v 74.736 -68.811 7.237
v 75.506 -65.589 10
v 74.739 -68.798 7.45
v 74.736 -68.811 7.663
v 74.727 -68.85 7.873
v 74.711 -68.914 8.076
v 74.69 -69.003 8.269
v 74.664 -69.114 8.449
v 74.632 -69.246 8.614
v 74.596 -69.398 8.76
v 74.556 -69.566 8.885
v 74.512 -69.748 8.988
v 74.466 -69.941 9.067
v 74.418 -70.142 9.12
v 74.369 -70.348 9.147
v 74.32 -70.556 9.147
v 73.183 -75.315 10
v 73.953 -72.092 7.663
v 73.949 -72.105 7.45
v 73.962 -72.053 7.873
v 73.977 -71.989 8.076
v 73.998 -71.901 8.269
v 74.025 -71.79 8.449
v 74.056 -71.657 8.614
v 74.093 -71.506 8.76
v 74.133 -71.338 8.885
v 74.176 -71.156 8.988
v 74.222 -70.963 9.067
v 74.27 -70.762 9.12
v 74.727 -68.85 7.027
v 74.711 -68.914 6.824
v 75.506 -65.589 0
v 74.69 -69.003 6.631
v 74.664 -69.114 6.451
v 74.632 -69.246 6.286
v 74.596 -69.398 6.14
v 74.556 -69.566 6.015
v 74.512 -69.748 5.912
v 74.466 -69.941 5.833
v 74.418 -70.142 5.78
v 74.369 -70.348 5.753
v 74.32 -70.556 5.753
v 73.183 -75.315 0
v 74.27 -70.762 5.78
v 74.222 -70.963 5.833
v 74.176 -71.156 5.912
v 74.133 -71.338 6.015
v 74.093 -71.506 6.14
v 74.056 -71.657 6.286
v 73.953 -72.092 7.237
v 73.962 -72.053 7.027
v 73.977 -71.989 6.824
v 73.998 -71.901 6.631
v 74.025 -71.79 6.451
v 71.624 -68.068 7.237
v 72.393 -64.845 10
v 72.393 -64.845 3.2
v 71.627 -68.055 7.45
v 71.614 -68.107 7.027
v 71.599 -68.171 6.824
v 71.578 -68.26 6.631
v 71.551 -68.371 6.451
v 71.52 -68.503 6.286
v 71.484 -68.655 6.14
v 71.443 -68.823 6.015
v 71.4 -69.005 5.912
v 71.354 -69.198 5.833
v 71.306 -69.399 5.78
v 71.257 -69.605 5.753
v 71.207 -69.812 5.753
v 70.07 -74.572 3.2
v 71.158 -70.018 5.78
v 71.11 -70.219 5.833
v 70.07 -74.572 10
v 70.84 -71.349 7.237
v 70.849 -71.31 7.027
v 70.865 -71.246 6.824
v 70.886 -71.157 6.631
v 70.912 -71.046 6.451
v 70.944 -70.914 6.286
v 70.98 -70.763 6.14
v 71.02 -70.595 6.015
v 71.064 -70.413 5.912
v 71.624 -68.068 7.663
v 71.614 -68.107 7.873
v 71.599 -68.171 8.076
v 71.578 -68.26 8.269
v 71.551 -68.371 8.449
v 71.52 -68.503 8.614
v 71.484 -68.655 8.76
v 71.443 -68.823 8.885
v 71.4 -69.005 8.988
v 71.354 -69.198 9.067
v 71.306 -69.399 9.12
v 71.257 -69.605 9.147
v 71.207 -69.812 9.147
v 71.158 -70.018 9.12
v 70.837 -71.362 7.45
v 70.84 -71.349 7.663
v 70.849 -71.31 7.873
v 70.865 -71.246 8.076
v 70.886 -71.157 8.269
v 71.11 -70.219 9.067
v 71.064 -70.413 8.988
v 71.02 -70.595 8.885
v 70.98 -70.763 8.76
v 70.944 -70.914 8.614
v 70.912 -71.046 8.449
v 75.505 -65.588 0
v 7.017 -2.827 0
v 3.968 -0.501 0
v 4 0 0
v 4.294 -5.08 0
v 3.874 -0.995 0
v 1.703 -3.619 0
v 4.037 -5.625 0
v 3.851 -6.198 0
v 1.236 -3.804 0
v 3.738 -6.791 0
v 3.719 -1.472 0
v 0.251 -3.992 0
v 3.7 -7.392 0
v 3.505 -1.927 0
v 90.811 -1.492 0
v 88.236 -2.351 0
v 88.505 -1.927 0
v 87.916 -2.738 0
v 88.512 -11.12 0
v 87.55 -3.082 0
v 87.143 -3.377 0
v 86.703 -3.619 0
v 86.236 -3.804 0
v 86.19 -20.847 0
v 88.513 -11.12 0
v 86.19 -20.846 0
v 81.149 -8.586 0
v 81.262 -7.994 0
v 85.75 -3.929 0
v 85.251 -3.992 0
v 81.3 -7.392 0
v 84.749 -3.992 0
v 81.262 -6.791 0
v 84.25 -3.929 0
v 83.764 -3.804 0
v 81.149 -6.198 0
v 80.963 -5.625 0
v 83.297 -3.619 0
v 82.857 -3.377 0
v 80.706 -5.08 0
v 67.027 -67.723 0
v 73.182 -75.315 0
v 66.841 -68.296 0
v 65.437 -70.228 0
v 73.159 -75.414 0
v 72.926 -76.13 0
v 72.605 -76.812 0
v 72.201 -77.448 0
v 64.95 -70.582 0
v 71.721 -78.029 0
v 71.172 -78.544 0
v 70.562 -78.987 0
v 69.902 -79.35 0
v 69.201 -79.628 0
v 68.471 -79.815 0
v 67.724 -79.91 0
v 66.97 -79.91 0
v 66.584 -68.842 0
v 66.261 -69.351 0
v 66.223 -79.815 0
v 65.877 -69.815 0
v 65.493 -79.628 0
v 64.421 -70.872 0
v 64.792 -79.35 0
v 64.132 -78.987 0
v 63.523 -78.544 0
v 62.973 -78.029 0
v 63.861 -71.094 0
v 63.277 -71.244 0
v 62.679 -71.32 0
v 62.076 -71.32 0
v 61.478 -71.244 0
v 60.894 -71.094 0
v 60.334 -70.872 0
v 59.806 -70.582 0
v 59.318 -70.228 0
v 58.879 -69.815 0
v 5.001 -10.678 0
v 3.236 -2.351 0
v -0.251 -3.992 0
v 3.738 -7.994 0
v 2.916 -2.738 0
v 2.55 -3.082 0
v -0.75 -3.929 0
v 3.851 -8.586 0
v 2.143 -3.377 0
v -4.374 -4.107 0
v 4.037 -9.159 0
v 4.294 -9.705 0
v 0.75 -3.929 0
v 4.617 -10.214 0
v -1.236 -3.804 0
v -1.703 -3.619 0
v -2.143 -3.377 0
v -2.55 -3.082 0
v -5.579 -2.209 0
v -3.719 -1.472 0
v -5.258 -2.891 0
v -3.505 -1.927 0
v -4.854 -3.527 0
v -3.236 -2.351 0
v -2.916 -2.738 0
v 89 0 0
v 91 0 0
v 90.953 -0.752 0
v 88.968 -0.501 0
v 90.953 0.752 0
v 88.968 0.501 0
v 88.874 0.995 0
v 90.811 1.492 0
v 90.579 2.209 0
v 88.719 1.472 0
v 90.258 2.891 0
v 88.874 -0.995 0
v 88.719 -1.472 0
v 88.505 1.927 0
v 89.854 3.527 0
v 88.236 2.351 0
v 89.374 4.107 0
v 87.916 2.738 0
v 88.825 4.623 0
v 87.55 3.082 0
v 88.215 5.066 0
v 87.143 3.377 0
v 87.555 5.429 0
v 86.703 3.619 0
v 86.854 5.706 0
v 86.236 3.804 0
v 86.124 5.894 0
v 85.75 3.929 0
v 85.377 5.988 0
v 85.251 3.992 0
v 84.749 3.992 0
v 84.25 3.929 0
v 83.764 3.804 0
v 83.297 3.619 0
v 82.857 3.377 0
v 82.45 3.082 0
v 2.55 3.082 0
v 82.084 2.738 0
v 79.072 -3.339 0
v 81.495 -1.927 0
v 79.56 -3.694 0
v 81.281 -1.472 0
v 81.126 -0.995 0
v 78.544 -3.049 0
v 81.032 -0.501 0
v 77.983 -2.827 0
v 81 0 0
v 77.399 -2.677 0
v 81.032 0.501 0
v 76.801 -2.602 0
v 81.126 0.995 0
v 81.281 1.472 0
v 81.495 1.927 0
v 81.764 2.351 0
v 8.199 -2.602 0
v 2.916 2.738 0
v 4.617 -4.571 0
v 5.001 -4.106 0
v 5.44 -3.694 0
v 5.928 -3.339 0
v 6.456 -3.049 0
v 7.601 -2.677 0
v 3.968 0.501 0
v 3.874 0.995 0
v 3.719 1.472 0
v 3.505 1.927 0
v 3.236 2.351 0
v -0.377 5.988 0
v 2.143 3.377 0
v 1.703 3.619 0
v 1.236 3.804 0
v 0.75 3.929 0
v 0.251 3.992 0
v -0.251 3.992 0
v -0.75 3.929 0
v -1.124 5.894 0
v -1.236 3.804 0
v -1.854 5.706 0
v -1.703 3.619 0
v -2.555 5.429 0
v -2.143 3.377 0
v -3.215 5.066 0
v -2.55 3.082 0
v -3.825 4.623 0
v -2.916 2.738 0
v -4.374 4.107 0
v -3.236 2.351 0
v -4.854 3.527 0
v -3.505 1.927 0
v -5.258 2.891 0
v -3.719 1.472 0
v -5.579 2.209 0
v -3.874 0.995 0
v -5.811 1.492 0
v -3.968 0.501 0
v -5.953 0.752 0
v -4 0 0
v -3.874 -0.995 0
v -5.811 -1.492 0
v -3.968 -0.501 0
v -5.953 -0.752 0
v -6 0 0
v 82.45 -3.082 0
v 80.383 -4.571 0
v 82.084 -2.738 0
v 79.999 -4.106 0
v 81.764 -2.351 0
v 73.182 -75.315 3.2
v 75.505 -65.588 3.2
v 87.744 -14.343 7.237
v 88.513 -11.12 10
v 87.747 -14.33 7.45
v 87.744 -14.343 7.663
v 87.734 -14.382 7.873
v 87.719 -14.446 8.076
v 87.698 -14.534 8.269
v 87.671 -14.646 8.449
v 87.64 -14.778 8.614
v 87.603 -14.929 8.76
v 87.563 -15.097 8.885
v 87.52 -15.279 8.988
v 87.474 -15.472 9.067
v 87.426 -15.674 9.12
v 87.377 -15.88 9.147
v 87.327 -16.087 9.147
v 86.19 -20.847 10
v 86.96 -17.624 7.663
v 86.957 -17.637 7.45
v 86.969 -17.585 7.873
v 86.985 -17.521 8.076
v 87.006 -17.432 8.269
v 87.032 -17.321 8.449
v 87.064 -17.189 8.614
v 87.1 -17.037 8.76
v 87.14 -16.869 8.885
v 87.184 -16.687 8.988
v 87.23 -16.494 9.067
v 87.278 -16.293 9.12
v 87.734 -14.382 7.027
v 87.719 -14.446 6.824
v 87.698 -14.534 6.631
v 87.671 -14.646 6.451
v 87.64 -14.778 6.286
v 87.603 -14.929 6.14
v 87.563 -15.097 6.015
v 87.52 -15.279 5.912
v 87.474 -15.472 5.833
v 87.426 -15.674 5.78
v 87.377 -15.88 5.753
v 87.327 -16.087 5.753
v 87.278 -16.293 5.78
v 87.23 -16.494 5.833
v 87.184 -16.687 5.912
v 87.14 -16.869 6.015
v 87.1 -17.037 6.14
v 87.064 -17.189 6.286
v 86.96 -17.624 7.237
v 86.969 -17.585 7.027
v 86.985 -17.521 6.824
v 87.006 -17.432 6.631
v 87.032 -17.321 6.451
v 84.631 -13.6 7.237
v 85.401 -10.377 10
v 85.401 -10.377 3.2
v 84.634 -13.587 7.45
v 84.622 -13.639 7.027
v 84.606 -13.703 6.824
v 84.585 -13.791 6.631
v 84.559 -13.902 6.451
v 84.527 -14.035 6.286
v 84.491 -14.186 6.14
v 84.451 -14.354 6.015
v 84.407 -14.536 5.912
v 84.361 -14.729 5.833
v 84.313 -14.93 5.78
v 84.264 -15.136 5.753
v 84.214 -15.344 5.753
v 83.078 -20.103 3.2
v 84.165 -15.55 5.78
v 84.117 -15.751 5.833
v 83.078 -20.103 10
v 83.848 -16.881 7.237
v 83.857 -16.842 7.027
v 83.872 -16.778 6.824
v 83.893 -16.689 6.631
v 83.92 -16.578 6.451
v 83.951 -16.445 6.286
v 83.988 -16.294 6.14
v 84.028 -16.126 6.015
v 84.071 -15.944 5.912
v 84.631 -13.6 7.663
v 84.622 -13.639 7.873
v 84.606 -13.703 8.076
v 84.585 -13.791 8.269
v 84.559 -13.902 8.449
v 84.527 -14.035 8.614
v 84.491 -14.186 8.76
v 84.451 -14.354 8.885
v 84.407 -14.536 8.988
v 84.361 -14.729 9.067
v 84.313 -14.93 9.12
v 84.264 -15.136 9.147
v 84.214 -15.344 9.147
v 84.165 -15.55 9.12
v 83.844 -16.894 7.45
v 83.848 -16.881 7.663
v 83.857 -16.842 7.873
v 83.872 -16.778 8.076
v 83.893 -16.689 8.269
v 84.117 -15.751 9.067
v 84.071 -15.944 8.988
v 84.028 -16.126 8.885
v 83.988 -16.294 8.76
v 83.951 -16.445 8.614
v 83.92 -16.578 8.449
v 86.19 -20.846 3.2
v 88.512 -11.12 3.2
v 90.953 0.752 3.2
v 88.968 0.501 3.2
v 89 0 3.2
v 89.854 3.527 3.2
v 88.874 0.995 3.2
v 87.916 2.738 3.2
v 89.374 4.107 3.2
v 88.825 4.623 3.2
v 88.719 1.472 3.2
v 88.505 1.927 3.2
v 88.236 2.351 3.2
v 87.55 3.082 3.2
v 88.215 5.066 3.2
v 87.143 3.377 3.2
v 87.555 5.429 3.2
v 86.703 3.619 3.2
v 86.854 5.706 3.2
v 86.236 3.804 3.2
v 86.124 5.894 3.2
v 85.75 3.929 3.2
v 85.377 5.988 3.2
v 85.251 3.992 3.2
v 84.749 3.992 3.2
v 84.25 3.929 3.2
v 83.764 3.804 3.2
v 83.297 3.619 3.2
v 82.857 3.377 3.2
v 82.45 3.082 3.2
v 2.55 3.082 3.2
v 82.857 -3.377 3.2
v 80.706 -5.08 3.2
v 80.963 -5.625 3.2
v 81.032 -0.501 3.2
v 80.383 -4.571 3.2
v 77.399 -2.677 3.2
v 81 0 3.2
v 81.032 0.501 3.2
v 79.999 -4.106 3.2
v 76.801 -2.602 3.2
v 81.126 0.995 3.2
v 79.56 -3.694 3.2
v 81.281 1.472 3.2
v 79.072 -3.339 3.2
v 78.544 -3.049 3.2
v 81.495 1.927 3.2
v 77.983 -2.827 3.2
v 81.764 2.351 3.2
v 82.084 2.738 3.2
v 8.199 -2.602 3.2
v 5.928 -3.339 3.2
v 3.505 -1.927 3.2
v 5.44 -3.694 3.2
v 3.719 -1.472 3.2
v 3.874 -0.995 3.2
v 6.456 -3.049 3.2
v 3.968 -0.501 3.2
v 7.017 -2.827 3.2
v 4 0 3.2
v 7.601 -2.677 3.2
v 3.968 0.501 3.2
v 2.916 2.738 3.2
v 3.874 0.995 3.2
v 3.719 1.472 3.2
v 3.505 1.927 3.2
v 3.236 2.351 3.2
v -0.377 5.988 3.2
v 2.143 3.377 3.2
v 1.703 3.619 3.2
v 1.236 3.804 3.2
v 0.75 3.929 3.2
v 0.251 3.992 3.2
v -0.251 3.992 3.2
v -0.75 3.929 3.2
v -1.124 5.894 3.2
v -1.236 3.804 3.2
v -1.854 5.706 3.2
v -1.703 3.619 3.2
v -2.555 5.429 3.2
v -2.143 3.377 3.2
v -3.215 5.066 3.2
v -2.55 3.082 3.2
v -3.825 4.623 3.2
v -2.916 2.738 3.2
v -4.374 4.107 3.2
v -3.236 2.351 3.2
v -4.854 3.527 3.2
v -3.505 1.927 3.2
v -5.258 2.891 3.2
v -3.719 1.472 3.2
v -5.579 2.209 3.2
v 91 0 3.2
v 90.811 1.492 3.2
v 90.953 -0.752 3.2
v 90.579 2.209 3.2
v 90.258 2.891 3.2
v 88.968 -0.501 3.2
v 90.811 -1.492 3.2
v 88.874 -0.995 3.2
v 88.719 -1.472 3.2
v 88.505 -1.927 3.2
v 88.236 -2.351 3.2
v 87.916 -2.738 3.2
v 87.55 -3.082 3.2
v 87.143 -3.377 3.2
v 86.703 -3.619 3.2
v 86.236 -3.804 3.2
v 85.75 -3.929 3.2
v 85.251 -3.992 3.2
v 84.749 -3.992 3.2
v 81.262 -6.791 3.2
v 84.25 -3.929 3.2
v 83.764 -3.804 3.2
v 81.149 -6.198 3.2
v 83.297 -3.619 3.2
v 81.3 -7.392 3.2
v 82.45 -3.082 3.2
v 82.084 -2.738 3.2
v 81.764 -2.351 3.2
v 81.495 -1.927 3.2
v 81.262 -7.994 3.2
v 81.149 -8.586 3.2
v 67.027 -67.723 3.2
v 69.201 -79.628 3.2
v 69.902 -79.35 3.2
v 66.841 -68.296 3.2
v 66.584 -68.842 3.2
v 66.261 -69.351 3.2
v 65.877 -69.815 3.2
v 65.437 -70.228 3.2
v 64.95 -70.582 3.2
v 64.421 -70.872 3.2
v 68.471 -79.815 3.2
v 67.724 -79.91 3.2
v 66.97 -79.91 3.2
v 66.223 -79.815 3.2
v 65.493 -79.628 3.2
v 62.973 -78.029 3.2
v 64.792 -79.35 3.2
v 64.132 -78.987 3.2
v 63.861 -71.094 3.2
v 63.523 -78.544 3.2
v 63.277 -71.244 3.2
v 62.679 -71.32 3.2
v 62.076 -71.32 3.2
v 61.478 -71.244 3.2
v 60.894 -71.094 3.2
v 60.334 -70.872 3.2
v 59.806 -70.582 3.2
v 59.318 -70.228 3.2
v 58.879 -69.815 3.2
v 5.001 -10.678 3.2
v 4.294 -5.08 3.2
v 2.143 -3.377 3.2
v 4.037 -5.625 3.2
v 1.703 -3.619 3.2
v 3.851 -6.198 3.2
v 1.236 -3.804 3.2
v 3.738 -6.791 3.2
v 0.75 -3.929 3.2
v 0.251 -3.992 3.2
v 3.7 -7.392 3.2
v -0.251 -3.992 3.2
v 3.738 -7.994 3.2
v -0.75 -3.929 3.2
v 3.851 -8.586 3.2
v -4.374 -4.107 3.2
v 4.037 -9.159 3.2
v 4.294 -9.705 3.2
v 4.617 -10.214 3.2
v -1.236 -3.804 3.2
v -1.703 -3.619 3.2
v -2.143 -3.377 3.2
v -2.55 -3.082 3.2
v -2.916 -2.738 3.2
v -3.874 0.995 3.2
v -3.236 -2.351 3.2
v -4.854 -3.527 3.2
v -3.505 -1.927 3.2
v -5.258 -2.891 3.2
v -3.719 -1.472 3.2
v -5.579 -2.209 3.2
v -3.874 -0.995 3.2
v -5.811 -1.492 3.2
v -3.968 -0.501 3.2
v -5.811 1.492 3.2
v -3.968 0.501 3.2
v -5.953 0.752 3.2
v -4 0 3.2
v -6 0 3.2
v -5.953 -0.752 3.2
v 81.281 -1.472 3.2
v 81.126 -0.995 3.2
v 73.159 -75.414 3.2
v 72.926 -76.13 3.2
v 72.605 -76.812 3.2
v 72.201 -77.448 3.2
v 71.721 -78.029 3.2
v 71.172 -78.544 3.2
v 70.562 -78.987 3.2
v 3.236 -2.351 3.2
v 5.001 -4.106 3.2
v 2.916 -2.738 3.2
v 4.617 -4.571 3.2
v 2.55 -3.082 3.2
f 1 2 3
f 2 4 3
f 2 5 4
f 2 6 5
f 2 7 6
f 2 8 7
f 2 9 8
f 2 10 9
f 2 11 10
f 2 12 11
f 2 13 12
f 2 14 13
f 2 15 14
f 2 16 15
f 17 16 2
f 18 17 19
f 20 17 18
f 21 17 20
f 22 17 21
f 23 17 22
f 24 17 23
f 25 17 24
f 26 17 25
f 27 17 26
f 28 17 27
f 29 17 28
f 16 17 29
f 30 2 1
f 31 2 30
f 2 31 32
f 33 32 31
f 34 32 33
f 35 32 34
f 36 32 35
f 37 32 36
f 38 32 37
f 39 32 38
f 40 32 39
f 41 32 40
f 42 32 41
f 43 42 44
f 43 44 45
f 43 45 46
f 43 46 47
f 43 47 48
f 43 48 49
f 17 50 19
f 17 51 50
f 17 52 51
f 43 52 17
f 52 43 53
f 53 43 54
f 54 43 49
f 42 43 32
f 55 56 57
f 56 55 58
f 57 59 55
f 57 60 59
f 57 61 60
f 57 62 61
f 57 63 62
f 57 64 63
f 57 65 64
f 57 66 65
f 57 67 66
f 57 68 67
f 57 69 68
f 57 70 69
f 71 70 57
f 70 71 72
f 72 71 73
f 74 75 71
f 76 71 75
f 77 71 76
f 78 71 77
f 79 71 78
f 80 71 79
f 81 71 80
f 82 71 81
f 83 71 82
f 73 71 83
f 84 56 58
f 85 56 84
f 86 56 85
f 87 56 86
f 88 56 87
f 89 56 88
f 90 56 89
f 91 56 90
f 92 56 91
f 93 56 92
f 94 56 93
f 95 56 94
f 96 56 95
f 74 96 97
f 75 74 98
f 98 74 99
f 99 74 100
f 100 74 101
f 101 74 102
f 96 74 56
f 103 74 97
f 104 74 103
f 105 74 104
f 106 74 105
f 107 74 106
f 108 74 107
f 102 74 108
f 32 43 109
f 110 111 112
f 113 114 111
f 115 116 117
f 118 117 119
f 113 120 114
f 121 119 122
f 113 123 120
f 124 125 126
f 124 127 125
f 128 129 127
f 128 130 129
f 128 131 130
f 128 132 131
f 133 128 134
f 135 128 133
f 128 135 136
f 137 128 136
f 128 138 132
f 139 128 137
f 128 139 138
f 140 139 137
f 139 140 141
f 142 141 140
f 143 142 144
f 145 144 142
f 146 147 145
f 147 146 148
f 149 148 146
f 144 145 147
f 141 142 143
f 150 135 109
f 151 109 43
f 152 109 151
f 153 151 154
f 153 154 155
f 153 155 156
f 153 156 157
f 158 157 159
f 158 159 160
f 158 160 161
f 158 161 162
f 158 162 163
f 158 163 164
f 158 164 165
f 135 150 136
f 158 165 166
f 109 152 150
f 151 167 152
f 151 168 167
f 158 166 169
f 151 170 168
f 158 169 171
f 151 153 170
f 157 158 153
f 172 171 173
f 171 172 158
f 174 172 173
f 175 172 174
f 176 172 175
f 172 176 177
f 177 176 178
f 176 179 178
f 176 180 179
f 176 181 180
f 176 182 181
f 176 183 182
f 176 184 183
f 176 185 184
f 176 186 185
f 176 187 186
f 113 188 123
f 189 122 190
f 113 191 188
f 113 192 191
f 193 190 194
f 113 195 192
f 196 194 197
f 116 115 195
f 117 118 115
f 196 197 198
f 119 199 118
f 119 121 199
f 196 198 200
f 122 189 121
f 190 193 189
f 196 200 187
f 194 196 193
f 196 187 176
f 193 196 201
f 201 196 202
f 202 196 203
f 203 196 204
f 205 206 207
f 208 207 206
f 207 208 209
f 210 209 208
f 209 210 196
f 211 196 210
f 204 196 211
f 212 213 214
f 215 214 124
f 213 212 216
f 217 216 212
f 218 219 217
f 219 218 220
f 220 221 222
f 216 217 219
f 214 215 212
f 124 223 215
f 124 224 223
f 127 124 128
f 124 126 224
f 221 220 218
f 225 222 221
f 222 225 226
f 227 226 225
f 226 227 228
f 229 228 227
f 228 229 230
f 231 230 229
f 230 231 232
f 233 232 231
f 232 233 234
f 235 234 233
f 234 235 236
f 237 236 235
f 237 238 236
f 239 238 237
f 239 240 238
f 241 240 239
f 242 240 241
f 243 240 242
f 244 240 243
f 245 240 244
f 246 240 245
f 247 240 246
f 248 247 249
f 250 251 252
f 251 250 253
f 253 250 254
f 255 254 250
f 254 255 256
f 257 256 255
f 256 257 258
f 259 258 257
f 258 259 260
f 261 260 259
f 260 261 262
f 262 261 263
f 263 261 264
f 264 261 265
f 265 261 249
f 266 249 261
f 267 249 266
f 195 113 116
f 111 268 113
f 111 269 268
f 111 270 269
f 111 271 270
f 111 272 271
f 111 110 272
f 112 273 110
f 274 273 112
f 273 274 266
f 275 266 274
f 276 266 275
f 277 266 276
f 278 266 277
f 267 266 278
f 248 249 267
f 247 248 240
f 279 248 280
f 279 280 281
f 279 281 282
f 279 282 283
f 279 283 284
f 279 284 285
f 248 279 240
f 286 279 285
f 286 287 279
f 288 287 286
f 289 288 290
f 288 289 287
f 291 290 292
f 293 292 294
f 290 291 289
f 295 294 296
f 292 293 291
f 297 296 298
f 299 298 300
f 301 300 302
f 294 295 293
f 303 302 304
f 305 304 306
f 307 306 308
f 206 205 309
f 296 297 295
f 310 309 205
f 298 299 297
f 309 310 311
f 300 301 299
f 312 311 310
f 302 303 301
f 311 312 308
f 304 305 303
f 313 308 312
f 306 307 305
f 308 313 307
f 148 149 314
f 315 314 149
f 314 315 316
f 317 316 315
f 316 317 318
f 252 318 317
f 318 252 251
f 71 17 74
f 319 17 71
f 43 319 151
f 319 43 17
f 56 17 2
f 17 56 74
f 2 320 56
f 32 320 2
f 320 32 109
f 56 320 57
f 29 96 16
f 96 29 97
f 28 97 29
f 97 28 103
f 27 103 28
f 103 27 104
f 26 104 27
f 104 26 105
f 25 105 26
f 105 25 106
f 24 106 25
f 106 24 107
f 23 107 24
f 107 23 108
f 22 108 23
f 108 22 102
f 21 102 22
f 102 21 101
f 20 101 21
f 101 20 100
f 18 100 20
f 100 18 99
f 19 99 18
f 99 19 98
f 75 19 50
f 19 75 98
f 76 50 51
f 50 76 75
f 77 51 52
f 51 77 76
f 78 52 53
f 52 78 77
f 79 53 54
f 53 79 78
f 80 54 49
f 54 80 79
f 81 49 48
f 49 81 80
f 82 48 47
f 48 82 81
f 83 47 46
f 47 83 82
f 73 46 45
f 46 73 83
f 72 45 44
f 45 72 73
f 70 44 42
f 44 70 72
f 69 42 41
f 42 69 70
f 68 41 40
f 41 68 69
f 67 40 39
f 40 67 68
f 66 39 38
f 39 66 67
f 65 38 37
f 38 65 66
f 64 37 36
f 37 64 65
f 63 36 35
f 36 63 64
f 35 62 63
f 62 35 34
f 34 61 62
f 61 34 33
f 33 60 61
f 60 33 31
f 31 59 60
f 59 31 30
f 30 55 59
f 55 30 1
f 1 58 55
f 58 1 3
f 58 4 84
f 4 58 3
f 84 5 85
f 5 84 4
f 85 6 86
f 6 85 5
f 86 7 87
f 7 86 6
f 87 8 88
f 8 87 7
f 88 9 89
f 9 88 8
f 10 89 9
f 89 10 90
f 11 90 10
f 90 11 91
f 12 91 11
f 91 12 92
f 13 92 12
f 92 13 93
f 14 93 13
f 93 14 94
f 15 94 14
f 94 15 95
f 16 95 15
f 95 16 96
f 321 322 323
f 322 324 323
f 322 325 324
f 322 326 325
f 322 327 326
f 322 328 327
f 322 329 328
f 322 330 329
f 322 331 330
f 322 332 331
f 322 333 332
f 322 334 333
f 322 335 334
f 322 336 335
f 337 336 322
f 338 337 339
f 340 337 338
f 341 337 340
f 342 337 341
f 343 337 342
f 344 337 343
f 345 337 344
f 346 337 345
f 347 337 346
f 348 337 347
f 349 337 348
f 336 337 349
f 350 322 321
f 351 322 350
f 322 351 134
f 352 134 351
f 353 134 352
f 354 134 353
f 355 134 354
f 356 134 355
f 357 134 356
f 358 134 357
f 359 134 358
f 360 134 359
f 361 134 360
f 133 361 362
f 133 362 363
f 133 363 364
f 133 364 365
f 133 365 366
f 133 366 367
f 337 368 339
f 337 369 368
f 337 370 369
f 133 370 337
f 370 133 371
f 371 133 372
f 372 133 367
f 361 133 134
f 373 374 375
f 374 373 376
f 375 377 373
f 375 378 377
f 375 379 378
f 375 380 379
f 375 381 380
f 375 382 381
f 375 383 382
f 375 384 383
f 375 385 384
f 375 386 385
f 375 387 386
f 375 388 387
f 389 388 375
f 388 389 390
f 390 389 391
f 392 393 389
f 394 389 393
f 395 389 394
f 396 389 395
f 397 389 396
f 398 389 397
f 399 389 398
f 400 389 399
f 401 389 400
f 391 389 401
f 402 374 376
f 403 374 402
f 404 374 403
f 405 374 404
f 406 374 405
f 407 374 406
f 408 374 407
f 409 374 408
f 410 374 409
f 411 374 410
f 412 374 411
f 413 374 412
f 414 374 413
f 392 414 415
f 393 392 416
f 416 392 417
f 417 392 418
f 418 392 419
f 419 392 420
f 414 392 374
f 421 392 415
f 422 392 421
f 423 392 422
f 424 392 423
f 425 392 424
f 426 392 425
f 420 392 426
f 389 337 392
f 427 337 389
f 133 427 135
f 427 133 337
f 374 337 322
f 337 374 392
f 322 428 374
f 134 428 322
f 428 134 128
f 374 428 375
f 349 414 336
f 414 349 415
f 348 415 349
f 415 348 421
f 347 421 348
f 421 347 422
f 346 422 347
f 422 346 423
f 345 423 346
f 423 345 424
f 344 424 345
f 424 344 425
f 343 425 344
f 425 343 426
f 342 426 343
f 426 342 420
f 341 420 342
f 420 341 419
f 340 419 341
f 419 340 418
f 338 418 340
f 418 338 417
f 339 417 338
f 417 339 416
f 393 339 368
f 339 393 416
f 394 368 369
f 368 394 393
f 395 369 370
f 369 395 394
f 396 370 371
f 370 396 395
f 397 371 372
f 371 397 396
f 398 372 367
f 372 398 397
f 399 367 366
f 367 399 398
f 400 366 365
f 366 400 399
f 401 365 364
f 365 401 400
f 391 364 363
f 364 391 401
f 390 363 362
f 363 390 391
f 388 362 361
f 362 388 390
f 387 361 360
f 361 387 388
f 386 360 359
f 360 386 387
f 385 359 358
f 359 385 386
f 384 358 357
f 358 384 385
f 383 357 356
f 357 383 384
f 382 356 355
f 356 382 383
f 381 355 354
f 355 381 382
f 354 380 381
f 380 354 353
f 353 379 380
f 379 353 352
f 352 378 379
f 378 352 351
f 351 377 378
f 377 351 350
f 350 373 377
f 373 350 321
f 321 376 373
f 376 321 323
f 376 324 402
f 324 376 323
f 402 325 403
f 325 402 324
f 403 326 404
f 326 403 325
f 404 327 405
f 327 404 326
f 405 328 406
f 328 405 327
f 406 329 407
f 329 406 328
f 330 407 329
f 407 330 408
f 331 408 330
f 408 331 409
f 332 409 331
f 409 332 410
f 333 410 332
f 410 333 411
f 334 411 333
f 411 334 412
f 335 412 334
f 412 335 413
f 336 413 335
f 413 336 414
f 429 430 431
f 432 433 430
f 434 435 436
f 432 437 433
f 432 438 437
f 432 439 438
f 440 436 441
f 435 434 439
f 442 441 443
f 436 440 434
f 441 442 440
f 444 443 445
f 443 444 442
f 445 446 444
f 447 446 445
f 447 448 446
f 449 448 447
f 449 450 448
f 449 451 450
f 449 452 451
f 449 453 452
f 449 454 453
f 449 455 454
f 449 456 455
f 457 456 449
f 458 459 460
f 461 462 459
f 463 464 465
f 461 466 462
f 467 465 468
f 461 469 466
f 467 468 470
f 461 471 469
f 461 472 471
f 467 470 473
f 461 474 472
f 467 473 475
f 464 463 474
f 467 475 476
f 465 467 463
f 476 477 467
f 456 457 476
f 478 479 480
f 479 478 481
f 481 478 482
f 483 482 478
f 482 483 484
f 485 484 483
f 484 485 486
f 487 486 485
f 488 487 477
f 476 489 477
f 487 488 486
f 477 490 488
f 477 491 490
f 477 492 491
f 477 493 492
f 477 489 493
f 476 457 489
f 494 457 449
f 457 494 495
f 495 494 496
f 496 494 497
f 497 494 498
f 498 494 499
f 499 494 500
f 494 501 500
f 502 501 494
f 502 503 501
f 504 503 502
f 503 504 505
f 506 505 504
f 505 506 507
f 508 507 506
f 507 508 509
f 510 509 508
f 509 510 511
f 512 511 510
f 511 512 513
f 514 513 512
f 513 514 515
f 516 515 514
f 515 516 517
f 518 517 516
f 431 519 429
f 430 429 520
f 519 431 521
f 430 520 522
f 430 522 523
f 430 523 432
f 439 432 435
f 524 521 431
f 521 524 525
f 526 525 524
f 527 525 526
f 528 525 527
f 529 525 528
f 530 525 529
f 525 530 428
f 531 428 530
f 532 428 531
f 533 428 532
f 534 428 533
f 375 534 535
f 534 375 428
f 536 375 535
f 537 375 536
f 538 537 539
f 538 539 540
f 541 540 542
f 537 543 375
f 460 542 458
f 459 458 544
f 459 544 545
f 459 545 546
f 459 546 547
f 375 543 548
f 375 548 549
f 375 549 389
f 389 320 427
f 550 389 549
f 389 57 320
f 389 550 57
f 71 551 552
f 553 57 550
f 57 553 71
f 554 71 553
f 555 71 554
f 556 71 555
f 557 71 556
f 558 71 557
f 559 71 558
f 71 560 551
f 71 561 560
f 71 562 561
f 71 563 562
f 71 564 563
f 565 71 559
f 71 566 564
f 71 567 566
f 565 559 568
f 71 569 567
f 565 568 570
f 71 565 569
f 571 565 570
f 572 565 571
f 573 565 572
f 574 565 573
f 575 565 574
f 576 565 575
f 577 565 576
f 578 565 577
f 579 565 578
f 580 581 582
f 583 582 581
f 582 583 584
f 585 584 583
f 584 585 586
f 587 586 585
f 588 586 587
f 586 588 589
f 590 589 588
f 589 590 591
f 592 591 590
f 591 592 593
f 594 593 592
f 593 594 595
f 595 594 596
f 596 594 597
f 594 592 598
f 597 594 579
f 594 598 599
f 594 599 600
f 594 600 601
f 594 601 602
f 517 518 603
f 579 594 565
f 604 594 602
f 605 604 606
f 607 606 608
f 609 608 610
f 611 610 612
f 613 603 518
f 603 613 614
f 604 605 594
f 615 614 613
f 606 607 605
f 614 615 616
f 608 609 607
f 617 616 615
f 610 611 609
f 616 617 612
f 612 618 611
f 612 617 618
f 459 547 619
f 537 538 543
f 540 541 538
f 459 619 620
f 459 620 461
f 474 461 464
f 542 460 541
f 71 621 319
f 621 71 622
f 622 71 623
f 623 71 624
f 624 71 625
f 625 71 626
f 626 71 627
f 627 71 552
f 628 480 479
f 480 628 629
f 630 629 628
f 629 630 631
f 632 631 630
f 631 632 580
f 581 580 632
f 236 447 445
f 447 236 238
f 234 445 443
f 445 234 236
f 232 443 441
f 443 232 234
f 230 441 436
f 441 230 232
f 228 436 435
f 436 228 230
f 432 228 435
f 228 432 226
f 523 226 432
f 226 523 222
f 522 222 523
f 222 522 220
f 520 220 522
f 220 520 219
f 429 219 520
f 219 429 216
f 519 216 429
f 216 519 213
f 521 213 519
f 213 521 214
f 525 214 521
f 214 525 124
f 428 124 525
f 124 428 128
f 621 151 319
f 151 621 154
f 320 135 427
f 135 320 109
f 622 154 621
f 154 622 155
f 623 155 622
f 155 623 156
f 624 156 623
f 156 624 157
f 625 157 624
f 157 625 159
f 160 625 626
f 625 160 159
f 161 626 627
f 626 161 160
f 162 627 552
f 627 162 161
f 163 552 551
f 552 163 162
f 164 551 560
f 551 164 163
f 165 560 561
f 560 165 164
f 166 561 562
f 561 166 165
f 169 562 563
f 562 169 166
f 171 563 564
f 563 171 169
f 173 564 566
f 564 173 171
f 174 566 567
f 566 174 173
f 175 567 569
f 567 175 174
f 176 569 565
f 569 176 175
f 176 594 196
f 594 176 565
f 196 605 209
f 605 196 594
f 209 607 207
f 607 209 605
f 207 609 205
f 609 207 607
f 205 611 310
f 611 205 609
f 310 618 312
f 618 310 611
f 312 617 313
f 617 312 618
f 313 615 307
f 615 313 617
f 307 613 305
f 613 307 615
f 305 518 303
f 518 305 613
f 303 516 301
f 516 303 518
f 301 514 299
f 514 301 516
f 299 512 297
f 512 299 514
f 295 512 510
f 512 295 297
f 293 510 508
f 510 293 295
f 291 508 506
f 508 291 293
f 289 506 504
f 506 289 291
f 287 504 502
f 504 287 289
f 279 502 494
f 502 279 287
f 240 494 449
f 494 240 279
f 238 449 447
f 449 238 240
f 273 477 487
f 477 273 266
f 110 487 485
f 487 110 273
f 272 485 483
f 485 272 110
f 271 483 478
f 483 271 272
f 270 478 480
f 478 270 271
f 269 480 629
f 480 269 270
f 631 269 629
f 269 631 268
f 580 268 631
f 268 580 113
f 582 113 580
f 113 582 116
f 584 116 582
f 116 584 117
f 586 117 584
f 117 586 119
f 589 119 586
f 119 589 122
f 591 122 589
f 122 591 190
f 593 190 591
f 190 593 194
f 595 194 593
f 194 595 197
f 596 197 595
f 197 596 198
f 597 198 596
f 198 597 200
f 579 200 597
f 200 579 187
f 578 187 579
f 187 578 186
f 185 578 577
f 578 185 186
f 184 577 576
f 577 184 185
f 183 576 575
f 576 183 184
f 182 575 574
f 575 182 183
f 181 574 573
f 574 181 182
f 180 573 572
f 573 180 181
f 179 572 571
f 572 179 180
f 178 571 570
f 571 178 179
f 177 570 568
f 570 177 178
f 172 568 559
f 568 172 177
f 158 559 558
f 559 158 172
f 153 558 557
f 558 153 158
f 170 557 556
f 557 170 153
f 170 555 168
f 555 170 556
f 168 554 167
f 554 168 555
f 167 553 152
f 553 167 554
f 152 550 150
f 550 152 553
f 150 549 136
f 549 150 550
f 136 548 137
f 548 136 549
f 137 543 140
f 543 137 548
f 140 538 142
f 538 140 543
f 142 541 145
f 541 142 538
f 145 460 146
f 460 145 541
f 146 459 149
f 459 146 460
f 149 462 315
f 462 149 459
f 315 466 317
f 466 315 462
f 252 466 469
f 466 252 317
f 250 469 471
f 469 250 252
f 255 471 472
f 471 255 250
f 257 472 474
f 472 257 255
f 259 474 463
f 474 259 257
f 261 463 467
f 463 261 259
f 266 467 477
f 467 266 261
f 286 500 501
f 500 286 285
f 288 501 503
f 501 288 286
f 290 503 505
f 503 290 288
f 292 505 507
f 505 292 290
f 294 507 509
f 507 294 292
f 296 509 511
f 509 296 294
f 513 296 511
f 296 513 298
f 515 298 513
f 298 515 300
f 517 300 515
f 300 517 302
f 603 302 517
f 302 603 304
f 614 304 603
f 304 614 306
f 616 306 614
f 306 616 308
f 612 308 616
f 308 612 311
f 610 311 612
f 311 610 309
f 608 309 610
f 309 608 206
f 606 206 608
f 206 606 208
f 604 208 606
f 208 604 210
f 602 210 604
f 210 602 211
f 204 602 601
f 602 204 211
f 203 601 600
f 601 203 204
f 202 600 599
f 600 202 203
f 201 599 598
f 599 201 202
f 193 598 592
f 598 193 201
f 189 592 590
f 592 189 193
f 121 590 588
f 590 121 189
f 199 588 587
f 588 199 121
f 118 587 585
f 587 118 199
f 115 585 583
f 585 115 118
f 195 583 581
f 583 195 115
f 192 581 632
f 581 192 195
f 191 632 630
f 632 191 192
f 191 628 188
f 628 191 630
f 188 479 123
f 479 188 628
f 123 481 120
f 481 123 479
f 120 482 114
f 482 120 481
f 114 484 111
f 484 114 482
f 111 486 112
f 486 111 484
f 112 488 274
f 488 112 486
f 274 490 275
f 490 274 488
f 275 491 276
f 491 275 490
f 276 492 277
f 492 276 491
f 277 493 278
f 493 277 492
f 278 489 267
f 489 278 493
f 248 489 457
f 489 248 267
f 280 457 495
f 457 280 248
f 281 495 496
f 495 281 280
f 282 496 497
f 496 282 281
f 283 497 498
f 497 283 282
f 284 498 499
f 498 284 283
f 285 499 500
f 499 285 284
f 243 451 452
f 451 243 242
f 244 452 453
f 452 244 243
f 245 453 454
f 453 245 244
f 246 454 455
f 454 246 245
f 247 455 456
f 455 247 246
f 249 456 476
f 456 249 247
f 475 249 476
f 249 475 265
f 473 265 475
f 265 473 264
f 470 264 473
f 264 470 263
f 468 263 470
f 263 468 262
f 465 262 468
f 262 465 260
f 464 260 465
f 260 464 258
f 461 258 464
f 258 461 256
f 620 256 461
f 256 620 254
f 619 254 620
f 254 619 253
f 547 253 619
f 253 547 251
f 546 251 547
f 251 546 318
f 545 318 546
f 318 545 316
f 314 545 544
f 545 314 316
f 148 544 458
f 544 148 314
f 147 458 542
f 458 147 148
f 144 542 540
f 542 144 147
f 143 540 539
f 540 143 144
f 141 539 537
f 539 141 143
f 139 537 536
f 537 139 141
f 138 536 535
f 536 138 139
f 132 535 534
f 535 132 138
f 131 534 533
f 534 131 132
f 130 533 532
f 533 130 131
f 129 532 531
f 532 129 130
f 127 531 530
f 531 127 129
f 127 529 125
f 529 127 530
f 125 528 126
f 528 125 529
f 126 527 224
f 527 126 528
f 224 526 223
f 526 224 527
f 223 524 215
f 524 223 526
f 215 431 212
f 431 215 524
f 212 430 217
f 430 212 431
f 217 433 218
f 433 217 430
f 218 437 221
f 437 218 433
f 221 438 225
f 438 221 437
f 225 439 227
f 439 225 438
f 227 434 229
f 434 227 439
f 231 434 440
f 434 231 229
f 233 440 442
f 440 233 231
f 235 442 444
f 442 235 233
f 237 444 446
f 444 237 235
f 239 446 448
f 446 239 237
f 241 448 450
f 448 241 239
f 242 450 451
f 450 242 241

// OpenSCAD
$fn = 50;

r1 = 8/2; // big mounting holes
r2 = 3.4/2; // PCB mounting hols
a = 85; // distance between large mounting holes (centers)
b = 100; // lift arm of the bracket, sets the angle of the bracket
d = 56; // distance between PCB mounting holes (centers)
c = d+20; // extra size for the PCB mount part of the bracket

tab_size = 10;  // square tab size

thickness = 3.2; // thickness of the bracket and tabs
sc = 0.8; // center removal scale factor
mink = 1.5; // r1*mink(owski) produces the rounded edges and the hole material

translate([0,0,thickness]) rotate([180,0,0]) union()
{
	linear_extrude(height = thickness) difference()
	{
		minkowski()
		{
			polygon(points = [[0,0], [a,0], [b*cos(acos((pow(a,2)+pow(b,2)-pow(c,2))/(2*a*b))), b*sin(acos((pow(a,2)+pow(b,2)-pow(c,2))/(2*a*b)))]], paths = [[0,1,2,0]]);
			circle(r = mink*r1);
		}

		circle(r = r1);
		translate([a,0]) circle(r = r1);
		
		translate([a/2-(a/2)*sc,b*sin(acos((pow(a,2)+pow(b,2)-pow(c,2))/(2*a*b)))/2-(b*sin(acos((pow(a,2)+pow(b,2)-pow(c,2))/(2*a*b)))/2)*sc]) scale(v = [sc,sc]) minkowski()
		{
			polygon(points = [[0,0], [a,0], [b*cos(acos((pow(a,2)+pow(b,2)-pow(c,2))/(2*a*b))), b*sin(acos((pow(a,2)+pow(b,2)-pow(c,2))/(2*a*b)))]], paths = [[0,1,2,0]]);
			circle(r = mink*r1);
		}
	}

	//translate([tab_size/2+mink*r1, tab_size/2+mink*r1,0])
	translate([b*cos(acos((pow(a,2)+pow(b,2)-pow(c,2))/(2*a*b))), b*sin(acos((pow(a,2)+pow(b,2)-pow(c,2))/(2*a*b)))]) rotate([0,0,-acos((pow(a,2)+pow(c,2)-pow(b,2))/(2*a*c))]) translate([tab_size/2, mink*r1-thickness, -tab_size/2]) rotate([90,0,0]) union()
	{
		translate([0,thickness,-thickness]) linear_extrude(height = thickness) difference()
		{
			square([tab_size, tab_size], center = true);
			translate([0,-tab_size/2+r2*mink]) circle(r = r2);
		}

		translate([0,thickness,-thickness]) translate([d,0]) linear_extrude(height = thickness) difference()
		{
			square([tab_size, tab_size], center = true);
			translate([0,-tab_size/2+r2*mink]) circle(r = r2);
		}
	}
}
